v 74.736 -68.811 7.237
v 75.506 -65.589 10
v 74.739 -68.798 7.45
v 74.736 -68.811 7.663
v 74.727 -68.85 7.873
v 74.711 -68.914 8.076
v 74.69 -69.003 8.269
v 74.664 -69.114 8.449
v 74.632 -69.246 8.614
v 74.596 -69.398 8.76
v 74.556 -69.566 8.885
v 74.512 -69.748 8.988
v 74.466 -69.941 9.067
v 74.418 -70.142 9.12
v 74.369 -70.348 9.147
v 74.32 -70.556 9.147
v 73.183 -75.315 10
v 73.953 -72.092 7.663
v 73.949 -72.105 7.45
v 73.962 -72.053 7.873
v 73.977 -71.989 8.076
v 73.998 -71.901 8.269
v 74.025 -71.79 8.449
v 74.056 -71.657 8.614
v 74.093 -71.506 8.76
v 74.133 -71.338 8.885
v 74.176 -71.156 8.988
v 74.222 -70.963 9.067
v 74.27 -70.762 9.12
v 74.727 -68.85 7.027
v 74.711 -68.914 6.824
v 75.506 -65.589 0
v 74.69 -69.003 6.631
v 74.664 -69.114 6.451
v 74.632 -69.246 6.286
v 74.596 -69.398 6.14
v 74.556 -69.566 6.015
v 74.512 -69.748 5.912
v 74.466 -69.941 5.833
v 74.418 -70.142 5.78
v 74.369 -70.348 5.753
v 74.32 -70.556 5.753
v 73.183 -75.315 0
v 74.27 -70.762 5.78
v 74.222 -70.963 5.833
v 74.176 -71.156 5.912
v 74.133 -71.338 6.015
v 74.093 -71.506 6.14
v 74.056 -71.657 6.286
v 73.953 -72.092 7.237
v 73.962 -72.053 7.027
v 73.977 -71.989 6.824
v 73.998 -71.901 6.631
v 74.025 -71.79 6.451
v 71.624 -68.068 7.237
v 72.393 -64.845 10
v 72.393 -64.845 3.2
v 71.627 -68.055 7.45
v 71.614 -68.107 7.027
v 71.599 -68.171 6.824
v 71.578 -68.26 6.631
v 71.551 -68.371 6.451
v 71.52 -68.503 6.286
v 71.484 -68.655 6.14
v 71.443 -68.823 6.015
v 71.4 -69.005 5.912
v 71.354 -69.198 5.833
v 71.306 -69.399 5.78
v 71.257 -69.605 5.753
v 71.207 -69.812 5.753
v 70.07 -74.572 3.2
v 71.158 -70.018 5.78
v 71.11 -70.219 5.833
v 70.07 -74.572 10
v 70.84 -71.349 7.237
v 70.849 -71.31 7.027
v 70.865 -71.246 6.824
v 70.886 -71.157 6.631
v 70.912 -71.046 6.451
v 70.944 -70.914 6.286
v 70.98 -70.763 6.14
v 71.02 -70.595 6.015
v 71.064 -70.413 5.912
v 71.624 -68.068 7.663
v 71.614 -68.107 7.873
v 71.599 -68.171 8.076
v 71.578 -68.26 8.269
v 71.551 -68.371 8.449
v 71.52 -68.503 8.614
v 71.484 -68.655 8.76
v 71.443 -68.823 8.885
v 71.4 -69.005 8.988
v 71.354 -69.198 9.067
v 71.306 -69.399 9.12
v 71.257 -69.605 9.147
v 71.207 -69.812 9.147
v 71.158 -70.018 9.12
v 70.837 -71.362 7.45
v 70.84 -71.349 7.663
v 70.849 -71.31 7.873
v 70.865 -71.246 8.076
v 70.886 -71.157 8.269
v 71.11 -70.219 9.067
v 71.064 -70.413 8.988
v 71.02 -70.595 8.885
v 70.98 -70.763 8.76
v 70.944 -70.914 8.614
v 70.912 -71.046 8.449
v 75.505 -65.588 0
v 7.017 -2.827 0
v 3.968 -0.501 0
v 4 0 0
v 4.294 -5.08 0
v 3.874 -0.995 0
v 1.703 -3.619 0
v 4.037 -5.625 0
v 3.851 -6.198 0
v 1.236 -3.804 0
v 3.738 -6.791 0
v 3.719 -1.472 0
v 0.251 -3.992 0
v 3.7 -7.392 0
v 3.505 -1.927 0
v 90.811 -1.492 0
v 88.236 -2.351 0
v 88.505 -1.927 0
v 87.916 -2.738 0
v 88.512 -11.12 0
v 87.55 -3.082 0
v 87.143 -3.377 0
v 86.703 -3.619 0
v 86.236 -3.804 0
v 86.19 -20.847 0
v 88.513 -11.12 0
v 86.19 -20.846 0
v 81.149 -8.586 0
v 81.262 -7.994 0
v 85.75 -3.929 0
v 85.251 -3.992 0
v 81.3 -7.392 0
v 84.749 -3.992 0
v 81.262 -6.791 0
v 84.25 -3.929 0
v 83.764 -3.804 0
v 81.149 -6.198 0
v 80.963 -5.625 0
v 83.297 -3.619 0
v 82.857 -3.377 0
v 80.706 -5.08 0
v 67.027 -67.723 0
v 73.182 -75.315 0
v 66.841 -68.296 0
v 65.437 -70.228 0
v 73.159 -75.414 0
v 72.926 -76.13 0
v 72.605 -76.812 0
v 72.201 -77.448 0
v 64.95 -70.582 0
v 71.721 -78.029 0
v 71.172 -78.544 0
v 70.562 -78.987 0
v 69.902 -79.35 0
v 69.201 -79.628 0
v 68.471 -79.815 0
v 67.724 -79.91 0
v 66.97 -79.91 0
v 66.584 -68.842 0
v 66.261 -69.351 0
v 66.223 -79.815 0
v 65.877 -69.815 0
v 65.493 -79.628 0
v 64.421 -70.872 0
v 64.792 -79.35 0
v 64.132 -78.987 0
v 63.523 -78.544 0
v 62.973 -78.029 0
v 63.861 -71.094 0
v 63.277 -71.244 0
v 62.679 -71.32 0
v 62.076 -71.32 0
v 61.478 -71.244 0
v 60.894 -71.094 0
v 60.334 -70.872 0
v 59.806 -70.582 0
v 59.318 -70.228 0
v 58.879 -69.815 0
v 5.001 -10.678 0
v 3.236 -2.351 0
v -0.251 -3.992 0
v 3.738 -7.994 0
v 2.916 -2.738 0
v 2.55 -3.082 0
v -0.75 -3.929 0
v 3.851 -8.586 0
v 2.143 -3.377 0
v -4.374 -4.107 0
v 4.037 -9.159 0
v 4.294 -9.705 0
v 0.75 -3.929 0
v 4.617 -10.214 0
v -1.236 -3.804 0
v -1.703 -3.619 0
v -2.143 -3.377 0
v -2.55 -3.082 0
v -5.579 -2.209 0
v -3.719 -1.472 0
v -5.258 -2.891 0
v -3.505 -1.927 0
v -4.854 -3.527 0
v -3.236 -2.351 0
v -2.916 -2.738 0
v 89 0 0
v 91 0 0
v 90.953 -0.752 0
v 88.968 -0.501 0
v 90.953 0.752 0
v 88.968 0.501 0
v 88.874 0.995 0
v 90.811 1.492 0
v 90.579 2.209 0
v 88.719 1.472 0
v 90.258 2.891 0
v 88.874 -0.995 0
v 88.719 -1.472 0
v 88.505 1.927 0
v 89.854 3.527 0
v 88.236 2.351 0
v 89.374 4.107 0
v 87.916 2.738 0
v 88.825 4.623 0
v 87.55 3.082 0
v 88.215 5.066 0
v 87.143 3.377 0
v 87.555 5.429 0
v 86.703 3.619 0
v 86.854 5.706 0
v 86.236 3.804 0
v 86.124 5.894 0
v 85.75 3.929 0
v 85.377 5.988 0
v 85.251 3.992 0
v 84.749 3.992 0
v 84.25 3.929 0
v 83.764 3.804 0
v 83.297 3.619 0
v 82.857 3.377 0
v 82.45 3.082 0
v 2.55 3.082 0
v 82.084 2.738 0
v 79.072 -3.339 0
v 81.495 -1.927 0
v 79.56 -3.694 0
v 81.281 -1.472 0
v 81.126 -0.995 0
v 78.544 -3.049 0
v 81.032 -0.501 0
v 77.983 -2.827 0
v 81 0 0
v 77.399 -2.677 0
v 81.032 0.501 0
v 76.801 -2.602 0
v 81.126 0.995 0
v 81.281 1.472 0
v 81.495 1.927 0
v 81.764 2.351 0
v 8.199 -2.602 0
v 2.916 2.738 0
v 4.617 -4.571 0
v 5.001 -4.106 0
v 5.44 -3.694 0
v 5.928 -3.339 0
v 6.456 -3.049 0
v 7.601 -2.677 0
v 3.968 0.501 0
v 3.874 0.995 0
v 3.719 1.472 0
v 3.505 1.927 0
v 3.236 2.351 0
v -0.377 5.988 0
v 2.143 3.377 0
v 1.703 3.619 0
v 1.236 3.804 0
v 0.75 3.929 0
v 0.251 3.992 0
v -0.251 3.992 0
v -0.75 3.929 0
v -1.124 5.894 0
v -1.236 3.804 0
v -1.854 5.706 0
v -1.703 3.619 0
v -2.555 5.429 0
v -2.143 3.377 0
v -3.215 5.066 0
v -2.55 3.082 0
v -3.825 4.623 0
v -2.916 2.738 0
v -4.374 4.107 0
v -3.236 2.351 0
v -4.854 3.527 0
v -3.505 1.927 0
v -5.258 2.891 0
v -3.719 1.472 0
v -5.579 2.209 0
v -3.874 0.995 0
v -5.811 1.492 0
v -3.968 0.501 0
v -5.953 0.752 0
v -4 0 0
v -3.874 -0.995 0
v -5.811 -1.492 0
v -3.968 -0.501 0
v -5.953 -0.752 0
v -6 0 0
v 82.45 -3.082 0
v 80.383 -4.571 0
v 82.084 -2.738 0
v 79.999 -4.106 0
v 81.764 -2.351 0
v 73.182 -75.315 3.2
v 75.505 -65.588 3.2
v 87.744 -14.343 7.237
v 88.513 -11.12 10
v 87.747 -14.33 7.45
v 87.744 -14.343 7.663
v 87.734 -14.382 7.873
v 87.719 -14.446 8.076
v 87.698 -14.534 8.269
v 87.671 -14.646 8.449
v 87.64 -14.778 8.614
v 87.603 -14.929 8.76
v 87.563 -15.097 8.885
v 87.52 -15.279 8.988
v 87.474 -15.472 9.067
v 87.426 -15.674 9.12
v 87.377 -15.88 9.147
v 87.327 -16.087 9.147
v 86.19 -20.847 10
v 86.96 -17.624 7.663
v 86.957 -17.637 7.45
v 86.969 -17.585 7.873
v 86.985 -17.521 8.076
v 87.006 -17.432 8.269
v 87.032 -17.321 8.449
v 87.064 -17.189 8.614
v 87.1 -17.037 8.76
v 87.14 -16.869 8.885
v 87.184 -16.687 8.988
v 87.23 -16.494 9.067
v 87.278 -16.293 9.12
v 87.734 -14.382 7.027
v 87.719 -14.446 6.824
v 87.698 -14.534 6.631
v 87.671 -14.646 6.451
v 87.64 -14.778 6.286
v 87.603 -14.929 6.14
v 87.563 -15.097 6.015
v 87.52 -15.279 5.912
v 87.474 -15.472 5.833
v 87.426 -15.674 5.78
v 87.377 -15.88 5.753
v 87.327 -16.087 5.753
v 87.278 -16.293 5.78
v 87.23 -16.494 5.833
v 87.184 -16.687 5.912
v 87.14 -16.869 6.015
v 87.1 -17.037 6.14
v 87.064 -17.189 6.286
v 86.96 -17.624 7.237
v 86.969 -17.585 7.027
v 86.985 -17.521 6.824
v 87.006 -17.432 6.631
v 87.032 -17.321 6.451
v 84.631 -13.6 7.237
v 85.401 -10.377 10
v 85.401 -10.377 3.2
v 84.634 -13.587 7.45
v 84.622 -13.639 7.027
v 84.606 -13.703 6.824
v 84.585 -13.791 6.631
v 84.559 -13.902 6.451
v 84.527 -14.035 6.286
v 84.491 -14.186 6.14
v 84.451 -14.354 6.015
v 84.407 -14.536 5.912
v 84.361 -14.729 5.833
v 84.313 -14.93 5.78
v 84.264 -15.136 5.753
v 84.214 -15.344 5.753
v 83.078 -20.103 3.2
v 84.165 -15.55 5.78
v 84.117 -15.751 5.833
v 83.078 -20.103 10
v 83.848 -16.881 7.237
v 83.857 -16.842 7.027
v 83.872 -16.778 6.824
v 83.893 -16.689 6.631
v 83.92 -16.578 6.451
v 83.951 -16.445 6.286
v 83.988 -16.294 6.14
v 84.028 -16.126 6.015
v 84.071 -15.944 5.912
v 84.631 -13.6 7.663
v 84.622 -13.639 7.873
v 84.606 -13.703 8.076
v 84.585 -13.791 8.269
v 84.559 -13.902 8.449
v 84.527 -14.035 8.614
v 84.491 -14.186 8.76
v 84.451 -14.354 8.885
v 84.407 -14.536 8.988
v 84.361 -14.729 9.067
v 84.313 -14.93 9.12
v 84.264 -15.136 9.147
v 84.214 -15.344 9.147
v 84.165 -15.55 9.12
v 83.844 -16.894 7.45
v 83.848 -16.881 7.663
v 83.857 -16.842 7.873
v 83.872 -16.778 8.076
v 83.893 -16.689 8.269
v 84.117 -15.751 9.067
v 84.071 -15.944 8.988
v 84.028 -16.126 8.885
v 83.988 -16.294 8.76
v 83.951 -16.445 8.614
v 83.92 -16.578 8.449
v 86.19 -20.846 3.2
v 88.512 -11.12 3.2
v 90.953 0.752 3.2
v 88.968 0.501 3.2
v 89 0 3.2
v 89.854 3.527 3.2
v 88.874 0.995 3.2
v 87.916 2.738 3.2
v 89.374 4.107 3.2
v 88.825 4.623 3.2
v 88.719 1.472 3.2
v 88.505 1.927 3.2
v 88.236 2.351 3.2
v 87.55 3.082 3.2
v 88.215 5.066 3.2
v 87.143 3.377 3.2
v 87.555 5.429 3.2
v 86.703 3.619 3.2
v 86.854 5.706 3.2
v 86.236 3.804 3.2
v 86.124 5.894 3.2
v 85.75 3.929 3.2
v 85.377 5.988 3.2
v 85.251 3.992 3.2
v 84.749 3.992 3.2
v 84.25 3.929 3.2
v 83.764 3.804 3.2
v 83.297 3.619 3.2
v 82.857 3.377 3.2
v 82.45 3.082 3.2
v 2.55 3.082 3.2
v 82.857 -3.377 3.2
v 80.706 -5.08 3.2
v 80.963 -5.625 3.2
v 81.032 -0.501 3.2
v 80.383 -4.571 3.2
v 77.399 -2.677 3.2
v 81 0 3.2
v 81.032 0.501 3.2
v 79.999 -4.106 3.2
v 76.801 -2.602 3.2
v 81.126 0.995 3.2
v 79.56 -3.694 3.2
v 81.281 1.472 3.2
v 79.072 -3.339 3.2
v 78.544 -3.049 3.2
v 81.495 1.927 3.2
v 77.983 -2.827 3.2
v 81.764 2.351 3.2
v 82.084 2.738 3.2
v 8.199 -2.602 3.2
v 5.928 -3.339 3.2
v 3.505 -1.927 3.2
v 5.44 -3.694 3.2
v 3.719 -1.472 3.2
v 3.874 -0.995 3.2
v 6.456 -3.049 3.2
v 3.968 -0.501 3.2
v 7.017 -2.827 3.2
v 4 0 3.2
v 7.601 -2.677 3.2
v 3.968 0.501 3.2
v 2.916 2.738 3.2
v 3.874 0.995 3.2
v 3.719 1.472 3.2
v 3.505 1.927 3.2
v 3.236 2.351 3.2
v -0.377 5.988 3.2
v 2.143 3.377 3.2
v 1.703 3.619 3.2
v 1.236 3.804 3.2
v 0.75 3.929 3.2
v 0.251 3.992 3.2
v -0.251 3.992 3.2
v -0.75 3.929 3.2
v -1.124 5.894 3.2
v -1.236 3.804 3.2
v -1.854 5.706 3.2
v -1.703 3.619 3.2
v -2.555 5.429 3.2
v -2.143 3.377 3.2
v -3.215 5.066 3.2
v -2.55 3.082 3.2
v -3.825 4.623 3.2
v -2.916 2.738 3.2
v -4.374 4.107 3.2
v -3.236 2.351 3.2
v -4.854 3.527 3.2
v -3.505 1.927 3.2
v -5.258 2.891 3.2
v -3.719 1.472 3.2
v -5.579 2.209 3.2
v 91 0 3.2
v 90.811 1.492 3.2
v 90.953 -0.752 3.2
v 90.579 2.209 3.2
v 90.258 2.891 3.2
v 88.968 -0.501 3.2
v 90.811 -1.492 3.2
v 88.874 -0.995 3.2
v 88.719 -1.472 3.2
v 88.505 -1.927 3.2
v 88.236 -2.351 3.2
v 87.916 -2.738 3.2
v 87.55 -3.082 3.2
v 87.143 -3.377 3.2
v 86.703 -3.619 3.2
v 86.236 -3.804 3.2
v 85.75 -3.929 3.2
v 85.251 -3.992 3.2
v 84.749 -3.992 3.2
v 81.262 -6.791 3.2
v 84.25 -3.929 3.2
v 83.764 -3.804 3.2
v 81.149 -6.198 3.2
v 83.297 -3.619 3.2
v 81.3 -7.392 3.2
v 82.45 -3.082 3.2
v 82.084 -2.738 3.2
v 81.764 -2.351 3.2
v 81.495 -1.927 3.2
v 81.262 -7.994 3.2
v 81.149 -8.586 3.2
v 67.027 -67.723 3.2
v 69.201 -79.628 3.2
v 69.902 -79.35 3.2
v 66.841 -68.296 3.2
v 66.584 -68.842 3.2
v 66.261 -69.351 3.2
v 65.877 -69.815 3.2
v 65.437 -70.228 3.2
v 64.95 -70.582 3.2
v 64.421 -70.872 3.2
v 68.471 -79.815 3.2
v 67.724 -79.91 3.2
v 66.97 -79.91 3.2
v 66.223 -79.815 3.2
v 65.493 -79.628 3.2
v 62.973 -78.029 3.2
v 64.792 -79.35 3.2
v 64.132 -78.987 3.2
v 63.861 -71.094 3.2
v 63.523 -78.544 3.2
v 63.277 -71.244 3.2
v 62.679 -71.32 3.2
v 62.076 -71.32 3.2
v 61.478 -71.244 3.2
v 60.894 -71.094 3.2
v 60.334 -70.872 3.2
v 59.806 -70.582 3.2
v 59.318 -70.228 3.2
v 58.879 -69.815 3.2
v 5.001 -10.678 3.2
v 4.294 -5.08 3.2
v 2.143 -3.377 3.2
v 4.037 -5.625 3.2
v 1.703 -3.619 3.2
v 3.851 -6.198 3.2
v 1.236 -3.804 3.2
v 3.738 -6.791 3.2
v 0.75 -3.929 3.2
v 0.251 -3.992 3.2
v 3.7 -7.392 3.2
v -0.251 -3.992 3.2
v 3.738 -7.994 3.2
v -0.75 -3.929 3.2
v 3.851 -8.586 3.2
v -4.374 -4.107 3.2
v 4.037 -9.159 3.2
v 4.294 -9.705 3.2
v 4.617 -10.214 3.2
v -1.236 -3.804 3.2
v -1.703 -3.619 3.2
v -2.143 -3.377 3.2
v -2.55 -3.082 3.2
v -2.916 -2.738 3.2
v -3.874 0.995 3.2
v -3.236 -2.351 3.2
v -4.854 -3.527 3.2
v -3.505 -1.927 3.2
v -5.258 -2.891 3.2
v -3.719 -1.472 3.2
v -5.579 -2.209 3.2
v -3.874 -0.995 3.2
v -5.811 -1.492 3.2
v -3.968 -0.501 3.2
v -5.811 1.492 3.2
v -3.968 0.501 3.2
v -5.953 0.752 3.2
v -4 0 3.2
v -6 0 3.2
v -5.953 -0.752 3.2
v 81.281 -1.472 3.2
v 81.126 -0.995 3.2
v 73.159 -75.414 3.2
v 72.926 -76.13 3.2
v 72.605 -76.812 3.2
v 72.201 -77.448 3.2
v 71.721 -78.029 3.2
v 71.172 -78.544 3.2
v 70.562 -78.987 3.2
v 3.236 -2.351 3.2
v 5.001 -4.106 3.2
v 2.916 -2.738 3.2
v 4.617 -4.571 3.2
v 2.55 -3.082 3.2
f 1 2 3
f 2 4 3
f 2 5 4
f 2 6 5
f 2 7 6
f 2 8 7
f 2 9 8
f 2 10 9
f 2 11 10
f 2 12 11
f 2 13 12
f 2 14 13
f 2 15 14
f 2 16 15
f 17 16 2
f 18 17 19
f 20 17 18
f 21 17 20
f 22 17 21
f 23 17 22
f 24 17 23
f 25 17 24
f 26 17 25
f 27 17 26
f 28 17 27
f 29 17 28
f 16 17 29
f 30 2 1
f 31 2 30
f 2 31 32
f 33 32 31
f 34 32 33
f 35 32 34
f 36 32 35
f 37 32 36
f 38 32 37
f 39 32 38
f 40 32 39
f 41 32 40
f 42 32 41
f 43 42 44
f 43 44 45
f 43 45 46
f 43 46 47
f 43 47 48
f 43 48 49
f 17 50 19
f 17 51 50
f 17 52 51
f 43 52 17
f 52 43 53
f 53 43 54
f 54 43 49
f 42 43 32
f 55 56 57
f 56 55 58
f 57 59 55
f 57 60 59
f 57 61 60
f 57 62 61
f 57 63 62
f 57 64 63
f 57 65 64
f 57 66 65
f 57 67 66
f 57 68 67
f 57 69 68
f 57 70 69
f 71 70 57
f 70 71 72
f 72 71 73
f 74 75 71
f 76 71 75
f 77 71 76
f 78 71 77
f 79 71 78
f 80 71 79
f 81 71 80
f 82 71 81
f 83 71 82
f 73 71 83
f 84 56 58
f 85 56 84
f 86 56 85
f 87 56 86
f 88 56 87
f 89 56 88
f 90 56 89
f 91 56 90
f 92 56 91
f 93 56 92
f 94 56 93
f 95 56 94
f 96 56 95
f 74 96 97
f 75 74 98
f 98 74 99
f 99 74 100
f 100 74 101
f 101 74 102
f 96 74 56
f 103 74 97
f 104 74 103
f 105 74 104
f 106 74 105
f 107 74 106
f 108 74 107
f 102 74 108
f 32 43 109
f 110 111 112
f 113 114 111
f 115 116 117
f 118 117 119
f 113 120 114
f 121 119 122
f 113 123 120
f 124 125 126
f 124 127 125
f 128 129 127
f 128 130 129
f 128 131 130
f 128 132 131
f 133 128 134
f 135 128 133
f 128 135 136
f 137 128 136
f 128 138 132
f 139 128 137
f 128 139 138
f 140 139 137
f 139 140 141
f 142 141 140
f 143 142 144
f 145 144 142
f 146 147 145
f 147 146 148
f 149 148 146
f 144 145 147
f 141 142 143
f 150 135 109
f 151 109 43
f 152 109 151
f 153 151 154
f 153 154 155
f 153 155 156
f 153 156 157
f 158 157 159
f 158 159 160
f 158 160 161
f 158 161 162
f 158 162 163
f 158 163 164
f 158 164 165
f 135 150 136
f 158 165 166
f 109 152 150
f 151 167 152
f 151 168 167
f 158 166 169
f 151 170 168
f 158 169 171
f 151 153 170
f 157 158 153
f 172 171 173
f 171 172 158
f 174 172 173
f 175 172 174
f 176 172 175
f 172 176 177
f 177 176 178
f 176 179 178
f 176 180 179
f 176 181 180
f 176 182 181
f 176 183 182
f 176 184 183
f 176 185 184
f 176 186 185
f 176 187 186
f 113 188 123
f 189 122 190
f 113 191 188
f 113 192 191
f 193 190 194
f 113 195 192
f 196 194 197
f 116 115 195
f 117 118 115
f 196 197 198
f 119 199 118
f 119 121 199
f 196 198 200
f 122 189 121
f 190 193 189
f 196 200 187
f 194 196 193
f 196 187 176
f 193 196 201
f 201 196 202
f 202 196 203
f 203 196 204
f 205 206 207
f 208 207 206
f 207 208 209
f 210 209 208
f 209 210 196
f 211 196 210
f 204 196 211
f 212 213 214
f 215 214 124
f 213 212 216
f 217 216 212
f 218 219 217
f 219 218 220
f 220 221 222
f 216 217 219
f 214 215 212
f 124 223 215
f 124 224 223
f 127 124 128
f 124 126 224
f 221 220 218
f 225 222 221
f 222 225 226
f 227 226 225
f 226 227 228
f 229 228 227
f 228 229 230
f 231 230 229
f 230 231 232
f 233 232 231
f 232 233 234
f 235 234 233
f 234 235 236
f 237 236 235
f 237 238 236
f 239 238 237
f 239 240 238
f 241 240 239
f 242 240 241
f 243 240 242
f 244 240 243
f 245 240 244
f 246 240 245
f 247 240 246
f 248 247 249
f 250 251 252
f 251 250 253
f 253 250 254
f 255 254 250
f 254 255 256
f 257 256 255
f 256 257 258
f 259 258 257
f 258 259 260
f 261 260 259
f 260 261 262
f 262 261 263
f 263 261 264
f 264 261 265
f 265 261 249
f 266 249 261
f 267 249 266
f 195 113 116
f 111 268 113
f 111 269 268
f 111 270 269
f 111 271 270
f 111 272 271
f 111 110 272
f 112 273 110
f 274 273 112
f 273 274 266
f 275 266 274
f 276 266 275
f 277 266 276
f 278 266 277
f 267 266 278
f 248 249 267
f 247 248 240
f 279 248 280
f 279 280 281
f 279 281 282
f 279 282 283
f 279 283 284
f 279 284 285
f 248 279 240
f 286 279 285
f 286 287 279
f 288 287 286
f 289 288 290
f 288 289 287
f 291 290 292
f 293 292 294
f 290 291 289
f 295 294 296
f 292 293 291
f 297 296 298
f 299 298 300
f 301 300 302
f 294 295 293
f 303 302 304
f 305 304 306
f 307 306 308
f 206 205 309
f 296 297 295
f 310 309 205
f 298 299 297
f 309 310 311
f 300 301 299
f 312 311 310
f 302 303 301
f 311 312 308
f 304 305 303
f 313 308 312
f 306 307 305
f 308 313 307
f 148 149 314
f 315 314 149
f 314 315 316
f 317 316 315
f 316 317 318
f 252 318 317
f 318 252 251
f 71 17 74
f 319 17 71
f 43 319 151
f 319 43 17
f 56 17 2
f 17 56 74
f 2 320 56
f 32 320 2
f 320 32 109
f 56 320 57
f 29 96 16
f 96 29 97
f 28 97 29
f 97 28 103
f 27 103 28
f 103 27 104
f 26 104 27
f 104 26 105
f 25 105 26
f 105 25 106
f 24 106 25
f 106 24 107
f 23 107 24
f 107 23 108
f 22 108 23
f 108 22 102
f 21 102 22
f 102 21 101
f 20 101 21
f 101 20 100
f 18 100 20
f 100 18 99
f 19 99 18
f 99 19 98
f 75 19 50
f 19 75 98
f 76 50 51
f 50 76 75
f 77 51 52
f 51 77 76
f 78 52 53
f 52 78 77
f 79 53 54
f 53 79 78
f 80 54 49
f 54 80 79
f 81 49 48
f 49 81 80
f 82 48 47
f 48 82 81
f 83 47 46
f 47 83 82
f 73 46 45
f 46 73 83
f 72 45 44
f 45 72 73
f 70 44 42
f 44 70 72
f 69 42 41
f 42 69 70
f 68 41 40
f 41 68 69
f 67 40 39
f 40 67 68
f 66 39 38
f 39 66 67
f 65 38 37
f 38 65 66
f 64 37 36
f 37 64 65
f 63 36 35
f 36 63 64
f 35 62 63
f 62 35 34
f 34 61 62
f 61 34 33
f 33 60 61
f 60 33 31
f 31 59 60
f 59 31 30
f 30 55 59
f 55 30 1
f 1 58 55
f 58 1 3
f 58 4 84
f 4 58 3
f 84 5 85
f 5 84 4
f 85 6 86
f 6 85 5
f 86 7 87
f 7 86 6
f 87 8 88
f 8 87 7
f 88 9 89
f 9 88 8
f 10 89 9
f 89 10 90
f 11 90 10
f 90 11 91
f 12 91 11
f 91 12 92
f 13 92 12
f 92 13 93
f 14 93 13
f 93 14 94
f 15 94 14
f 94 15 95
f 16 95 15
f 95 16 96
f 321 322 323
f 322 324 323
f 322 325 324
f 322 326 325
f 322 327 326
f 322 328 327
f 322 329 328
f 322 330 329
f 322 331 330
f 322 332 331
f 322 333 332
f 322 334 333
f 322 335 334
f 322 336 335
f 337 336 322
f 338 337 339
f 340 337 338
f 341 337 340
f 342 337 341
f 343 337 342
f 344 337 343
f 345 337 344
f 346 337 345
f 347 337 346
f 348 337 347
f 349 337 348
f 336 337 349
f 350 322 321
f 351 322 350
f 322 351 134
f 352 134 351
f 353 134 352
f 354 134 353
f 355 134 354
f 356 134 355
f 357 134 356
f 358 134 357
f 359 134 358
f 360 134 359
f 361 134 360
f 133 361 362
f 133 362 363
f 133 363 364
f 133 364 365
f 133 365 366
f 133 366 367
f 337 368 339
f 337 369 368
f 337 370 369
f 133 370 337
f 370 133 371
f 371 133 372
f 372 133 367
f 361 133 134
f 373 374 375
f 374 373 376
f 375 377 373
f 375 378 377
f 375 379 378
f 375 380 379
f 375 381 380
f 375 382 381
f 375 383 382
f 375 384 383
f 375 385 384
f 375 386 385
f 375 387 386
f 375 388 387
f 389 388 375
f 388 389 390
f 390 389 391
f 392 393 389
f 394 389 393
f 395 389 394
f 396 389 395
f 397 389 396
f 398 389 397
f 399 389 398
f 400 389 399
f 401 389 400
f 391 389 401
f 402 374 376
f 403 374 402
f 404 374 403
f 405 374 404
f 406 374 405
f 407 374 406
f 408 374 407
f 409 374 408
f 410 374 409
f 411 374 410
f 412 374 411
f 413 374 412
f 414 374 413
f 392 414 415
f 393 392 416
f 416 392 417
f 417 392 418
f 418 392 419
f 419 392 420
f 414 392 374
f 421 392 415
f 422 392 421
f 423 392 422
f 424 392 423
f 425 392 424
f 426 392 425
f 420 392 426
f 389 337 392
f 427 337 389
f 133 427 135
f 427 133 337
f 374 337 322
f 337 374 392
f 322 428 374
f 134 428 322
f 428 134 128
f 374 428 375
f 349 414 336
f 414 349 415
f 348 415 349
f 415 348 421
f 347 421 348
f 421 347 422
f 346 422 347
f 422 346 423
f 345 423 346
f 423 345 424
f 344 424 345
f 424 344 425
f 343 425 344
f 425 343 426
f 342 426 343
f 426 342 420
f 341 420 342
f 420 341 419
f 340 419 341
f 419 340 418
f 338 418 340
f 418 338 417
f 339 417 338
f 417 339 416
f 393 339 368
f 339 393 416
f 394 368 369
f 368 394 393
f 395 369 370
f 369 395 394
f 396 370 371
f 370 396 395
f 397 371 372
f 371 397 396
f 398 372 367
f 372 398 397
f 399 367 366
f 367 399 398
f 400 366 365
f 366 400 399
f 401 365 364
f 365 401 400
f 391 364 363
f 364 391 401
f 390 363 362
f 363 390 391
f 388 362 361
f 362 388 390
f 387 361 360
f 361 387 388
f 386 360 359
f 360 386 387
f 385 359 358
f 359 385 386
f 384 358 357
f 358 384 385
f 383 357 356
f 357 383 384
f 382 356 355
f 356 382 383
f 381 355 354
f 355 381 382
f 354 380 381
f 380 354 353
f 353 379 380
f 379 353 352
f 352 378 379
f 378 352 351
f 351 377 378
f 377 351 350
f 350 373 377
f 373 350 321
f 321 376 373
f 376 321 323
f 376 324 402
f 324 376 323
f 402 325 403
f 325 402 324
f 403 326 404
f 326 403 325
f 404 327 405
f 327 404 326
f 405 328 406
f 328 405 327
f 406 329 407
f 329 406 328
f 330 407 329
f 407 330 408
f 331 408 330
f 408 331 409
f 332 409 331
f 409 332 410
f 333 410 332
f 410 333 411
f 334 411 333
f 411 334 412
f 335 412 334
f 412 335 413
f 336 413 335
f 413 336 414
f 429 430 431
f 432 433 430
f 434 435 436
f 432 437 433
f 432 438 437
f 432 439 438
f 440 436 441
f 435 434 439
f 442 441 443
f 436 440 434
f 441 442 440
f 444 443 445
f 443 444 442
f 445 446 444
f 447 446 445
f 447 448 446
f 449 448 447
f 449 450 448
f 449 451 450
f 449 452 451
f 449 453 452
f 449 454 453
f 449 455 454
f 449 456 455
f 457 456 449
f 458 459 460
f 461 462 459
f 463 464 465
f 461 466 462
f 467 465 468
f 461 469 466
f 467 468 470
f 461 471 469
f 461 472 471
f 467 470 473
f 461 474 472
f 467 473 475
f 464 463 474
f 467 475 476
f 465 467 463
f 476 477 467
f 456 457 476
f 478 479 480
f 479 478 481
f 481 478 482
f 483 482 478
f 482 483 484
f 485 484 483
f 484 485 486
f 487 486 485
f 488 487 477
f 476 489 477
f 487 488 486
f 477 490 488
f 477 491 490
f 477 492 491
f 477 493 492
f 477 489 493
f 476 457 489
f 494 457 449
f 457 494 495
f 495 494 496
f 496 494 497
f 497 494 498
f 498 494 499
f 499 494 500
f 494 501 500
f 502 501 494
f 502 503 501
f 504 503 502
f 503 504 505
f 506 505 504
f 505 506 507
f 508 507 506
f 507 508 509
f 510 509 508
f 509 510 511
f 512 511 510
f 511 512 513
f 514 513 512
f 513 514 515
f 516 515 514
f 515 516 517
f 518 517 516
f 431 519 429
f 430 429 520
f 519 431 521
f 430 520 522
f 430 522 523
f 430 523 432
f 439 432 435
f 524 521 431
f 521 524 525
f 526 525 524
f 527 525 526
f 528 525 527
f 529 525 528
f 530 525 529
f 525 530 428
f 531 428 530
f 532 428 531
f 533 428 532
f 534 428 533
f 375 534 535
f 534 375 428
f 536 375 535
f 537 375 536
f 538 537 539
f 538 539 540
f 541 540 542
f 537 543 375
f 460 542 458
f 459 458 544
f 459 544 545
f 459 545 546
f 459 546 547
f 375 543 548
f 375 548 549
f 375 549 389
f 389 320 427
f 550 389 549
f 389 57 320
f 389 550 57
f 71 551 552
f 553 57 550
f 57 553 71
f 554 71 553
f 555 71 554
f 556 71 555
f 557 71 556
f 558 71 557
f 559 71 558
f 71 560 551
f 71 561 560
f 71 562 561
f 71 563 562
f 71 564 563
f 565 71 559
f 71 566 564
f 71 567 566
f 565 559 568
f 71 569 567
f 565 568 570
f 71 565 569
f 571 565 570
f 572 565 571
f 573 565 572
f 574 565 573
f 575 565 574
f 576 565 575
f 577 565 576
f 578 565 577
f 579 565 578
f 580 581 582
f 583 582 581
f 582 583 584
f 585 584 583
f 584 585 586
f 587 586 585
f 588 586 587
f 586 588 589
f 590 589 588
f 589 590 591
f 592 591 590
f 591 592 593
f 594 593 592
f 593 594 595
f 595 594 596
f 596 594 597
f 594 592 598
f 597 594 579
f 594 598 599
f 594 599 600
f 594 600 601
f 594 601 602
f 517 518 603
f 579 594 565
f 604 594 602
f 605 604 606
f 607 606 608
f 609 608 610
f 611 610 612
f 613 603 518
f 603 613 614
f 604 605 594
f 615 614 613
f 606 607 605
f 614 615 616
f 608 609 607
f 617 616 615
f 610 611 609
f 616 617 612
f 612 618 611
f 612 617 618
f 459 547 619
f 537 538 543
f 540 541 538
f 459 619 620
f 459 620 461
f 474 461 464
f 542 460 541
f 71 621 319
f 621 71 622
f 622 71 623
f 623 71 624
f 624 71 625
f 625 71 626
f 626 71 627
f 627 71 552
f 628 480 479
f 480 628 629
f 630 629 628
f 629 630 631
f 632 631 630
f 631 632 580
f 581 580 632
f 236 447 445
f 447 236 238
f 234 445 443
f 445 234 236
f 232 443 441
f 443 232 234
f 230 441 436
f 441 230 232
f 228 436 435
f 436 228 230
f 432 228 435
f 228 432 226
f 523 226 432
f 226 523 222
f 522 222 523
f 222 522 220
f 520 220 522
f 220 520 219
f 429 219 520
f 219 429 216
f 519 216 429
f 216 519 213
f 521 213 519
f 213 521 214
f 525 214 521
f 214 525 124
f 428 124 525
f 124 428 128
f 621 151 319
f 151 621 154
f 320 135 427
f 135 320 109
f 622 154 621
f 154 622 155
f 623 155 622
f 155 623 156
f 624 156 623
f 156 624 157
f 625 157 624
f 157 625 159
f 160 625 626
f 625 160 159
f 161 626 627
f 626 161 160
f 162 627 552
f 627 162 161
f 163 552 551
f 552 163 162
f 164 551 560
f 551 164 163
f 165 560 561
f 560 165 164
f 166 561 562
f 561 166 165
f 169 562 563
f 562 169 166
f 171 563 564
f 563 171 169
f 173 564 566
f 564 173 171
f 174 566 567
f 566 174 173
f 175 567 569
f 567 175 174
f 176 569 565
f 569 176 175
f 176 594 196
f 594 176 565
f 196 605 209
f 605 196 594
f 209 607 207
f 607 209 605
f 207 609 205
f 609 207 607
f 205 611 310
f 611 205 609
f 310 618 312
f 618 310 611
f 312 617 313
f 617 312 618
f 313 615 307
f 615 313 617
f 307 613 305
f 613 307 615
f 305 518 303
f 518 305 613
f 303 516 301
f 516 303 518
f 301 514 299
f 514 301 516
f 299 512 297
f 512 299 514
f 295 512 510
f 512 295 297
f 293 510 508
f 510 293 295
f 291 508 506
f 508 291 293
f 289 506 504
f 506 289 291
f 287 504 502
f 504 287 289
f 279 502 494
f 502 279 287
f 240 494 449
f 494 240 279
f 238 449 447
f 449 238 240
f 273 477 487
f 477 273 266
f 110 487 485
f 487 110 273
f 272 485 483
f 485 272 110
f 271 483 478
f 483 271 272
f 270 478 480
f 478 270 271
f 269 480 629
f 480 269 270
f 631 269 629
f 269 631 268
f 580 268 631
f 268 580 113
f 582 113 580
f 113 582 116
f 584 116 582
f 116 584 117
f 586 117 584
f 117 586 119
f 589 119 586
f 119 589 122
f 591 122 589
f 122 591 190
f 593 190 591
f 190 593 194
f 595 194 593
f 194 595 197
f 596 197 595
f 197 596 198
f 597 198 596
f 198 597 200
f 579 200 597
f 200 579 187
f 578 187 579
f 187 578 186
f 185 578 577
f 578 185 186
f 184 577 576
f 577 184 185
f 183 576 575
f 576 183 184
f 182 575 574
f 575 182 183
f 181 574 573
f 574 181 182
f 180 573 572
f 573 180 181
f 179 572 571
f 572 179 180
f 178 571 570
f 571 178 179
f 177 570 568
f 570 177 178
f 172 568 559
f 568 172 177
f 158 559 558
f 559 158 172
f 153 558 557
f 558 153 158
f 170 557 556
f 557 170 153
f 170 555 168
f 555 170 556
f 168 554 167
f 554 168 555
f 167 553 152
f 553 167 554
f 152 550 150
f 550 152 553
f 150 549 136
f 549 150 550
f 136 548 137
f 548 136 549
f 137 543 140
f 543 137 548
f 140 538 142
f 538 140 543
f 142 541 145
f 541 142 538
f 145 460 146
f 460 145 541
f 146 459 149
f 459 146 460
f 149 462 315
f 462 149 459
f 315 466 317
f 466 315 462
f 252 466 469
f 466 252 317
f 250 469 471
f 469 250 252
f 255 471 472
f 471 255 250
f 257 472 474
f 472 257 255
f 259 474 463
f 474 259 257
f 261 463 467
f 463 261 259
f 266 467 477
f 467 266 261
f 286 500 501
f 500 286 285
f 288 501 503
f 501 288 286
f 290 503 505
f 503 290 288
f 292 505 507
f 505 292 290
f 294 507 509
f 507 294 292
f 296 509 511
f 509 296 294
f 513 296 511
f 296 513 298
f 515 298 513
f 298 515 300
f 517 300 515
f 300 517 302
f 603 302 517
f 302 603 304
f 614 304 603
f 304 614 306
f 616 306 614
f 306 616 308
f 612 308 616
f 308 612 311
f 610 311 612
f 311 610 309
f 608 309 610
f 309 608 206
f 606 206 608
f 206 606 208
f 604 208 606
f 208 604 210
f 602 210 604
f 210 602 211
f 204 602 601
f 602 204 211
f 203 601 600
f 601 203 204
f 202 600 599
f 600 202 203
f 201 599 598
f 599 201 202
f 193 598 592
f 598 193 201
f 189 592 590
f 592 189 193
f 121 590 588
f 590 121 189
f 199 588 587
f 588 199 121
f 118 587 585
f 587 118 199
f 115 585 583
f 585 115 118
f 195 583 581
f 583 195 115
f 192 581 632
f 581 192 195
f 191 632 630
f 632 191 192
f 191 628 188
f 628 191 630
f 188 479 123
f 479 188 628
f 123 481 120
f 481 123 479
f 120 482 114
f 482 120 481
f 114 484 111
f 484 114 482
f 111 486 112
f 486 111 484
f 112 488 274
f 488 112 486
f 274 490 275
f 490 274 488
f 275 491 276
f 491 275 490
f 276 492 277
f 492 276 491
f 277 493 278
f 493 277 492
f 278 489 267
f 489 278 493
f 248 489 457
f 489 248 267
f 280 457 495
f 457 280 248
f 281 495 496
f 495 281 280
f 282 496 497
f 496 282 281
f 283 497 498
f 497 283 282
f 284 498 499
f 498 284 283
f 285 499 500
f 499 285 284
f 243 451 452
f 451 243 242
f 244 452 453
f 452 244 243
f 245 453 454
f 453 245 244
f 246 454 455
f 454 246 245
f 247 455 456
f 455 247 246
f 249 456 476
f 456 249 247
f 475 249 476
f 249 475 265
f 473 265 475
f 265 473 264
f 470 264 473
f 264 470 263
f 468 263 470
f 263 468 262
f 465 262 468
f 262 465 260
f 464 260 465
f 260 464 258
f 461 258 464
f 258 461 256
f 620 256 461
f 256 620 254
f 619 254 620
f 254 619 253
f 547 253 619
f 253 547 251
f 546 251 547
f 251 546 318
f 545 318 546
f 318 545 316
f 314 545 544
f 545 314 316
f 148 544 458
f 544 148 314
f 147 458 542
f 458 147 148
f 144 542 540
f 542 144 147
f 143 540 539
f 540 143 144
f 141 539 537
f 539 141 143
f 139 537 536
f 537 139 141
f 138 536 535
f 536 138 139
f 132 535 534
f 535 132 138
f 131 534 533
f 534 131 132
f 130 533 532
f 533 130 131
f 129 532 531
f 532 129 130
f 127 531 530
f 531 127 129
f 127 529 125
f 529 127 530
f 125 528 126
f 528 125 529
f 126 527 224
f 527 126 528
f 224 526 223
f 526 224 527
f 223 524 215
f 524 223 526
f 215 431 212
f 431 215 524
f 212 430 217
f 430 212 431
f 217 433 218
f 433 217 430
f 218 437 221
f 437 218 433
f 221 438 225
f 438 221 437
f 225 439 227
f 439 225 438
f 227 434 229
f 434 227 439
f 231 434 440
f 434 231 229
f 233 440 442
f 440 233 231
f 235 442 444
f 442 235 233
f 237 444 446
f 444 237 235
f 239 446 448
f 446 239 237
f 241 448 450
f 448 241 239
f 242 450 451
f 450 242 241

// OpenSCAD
$fn = 50;

r1 = 8/2; // big mounting holes
r2 = 3.4/2; // PCB mounting hols
a = 85; // distance between large mounting holes (centers)
b = 100; // lift arm of the bracket, sets the angle of the bracket
d = 56; // distance between PCB mounting holes (centers)
c = d+20; // extra size for the PCB mount part of the bracket

tab_size = 10;  // square tab size

thickness = 3.2; // thickness of the bracket and tabs
sc = 0.8; // center removal scale factor
mink = 1.5; // r1*mink(owski) produces the rounded edges and the hole material

translate([0,0,thickness]) rotate([180,0,0]) union()
{
	linear_extrude(height = thickness) difference()
	{
		minkowski()
		{
			polygon(points = [[0,0], [a,0], [b*cos(acos((pow(a,2)+pow(b,2)-pow(c,2))/(2*a*b))), b*sin(acos((pow(a,2)+pow(b,2)-pow(c,2))/(2*a*b)))]], paths = [[0,1,2,0]]);
			circle(r = mink*r1);
		}

		circle(r = r1);
		translate([a,0]) circle(r = r1);
		
		translate([a/2-(a/2)*sc,b*sin(acos((pow(a,2)+pow(b,2)-pow(c,2))/(2*a*b)))/2-(b*sin(acos((pow(a,2)+pow(b,2)-pow(c,2))/(2*a*b)))/2)*sc]) scale(v = [sc,sc]) minkowski()
		{
			polygon(points = [[0,0], [a,0], [b*cos(acos((pow(a,2)+pow(b,2)-pow(c,2))/(2*a*b))), b*sin(acos((pow(a,2)+pow(b,2)-pow(c,2))/(2*a*b)))]], paths = [[0,1,2,0]]);
			circle(r = mink*r1);
		}
	}

	//translate([tab_size/2+mink*r1, tab_size/2+mink*r1,0])
	translate([b*cos(acos((pow(a,2)+pow(b,2)-pow(c,2))/(2*a*b))), b*sin(acos((pow(a,2)+pow(b,2)-pow(c,2))/(2*a*b)))]) rotate([0,0,-acos((pow(a,2)+pow(c,2)-pow(b,2))/(2*a*c))]) translate([tab_size/2, mink*r1-thickness, -tab_size/2]) rotate([90,0,0]) union()
	{
		translate([0,thickness,-thickness]) linear_extrude(height = thickness) difference()
		{
			square([tab_size, tab_size], center = true);
			translate([0,-tab_size/2+r2*mink]) circle(r = r2);
		}

		translate([0,thickness,-thickness]) translate([d,0]) linear_extrude(height = thickness) difference()
		{
			square([tab_size, tab_size], center = true);
			translate([0,-tab_size/2+r2*mink]) circle(r = r2);
		}
	}
}
